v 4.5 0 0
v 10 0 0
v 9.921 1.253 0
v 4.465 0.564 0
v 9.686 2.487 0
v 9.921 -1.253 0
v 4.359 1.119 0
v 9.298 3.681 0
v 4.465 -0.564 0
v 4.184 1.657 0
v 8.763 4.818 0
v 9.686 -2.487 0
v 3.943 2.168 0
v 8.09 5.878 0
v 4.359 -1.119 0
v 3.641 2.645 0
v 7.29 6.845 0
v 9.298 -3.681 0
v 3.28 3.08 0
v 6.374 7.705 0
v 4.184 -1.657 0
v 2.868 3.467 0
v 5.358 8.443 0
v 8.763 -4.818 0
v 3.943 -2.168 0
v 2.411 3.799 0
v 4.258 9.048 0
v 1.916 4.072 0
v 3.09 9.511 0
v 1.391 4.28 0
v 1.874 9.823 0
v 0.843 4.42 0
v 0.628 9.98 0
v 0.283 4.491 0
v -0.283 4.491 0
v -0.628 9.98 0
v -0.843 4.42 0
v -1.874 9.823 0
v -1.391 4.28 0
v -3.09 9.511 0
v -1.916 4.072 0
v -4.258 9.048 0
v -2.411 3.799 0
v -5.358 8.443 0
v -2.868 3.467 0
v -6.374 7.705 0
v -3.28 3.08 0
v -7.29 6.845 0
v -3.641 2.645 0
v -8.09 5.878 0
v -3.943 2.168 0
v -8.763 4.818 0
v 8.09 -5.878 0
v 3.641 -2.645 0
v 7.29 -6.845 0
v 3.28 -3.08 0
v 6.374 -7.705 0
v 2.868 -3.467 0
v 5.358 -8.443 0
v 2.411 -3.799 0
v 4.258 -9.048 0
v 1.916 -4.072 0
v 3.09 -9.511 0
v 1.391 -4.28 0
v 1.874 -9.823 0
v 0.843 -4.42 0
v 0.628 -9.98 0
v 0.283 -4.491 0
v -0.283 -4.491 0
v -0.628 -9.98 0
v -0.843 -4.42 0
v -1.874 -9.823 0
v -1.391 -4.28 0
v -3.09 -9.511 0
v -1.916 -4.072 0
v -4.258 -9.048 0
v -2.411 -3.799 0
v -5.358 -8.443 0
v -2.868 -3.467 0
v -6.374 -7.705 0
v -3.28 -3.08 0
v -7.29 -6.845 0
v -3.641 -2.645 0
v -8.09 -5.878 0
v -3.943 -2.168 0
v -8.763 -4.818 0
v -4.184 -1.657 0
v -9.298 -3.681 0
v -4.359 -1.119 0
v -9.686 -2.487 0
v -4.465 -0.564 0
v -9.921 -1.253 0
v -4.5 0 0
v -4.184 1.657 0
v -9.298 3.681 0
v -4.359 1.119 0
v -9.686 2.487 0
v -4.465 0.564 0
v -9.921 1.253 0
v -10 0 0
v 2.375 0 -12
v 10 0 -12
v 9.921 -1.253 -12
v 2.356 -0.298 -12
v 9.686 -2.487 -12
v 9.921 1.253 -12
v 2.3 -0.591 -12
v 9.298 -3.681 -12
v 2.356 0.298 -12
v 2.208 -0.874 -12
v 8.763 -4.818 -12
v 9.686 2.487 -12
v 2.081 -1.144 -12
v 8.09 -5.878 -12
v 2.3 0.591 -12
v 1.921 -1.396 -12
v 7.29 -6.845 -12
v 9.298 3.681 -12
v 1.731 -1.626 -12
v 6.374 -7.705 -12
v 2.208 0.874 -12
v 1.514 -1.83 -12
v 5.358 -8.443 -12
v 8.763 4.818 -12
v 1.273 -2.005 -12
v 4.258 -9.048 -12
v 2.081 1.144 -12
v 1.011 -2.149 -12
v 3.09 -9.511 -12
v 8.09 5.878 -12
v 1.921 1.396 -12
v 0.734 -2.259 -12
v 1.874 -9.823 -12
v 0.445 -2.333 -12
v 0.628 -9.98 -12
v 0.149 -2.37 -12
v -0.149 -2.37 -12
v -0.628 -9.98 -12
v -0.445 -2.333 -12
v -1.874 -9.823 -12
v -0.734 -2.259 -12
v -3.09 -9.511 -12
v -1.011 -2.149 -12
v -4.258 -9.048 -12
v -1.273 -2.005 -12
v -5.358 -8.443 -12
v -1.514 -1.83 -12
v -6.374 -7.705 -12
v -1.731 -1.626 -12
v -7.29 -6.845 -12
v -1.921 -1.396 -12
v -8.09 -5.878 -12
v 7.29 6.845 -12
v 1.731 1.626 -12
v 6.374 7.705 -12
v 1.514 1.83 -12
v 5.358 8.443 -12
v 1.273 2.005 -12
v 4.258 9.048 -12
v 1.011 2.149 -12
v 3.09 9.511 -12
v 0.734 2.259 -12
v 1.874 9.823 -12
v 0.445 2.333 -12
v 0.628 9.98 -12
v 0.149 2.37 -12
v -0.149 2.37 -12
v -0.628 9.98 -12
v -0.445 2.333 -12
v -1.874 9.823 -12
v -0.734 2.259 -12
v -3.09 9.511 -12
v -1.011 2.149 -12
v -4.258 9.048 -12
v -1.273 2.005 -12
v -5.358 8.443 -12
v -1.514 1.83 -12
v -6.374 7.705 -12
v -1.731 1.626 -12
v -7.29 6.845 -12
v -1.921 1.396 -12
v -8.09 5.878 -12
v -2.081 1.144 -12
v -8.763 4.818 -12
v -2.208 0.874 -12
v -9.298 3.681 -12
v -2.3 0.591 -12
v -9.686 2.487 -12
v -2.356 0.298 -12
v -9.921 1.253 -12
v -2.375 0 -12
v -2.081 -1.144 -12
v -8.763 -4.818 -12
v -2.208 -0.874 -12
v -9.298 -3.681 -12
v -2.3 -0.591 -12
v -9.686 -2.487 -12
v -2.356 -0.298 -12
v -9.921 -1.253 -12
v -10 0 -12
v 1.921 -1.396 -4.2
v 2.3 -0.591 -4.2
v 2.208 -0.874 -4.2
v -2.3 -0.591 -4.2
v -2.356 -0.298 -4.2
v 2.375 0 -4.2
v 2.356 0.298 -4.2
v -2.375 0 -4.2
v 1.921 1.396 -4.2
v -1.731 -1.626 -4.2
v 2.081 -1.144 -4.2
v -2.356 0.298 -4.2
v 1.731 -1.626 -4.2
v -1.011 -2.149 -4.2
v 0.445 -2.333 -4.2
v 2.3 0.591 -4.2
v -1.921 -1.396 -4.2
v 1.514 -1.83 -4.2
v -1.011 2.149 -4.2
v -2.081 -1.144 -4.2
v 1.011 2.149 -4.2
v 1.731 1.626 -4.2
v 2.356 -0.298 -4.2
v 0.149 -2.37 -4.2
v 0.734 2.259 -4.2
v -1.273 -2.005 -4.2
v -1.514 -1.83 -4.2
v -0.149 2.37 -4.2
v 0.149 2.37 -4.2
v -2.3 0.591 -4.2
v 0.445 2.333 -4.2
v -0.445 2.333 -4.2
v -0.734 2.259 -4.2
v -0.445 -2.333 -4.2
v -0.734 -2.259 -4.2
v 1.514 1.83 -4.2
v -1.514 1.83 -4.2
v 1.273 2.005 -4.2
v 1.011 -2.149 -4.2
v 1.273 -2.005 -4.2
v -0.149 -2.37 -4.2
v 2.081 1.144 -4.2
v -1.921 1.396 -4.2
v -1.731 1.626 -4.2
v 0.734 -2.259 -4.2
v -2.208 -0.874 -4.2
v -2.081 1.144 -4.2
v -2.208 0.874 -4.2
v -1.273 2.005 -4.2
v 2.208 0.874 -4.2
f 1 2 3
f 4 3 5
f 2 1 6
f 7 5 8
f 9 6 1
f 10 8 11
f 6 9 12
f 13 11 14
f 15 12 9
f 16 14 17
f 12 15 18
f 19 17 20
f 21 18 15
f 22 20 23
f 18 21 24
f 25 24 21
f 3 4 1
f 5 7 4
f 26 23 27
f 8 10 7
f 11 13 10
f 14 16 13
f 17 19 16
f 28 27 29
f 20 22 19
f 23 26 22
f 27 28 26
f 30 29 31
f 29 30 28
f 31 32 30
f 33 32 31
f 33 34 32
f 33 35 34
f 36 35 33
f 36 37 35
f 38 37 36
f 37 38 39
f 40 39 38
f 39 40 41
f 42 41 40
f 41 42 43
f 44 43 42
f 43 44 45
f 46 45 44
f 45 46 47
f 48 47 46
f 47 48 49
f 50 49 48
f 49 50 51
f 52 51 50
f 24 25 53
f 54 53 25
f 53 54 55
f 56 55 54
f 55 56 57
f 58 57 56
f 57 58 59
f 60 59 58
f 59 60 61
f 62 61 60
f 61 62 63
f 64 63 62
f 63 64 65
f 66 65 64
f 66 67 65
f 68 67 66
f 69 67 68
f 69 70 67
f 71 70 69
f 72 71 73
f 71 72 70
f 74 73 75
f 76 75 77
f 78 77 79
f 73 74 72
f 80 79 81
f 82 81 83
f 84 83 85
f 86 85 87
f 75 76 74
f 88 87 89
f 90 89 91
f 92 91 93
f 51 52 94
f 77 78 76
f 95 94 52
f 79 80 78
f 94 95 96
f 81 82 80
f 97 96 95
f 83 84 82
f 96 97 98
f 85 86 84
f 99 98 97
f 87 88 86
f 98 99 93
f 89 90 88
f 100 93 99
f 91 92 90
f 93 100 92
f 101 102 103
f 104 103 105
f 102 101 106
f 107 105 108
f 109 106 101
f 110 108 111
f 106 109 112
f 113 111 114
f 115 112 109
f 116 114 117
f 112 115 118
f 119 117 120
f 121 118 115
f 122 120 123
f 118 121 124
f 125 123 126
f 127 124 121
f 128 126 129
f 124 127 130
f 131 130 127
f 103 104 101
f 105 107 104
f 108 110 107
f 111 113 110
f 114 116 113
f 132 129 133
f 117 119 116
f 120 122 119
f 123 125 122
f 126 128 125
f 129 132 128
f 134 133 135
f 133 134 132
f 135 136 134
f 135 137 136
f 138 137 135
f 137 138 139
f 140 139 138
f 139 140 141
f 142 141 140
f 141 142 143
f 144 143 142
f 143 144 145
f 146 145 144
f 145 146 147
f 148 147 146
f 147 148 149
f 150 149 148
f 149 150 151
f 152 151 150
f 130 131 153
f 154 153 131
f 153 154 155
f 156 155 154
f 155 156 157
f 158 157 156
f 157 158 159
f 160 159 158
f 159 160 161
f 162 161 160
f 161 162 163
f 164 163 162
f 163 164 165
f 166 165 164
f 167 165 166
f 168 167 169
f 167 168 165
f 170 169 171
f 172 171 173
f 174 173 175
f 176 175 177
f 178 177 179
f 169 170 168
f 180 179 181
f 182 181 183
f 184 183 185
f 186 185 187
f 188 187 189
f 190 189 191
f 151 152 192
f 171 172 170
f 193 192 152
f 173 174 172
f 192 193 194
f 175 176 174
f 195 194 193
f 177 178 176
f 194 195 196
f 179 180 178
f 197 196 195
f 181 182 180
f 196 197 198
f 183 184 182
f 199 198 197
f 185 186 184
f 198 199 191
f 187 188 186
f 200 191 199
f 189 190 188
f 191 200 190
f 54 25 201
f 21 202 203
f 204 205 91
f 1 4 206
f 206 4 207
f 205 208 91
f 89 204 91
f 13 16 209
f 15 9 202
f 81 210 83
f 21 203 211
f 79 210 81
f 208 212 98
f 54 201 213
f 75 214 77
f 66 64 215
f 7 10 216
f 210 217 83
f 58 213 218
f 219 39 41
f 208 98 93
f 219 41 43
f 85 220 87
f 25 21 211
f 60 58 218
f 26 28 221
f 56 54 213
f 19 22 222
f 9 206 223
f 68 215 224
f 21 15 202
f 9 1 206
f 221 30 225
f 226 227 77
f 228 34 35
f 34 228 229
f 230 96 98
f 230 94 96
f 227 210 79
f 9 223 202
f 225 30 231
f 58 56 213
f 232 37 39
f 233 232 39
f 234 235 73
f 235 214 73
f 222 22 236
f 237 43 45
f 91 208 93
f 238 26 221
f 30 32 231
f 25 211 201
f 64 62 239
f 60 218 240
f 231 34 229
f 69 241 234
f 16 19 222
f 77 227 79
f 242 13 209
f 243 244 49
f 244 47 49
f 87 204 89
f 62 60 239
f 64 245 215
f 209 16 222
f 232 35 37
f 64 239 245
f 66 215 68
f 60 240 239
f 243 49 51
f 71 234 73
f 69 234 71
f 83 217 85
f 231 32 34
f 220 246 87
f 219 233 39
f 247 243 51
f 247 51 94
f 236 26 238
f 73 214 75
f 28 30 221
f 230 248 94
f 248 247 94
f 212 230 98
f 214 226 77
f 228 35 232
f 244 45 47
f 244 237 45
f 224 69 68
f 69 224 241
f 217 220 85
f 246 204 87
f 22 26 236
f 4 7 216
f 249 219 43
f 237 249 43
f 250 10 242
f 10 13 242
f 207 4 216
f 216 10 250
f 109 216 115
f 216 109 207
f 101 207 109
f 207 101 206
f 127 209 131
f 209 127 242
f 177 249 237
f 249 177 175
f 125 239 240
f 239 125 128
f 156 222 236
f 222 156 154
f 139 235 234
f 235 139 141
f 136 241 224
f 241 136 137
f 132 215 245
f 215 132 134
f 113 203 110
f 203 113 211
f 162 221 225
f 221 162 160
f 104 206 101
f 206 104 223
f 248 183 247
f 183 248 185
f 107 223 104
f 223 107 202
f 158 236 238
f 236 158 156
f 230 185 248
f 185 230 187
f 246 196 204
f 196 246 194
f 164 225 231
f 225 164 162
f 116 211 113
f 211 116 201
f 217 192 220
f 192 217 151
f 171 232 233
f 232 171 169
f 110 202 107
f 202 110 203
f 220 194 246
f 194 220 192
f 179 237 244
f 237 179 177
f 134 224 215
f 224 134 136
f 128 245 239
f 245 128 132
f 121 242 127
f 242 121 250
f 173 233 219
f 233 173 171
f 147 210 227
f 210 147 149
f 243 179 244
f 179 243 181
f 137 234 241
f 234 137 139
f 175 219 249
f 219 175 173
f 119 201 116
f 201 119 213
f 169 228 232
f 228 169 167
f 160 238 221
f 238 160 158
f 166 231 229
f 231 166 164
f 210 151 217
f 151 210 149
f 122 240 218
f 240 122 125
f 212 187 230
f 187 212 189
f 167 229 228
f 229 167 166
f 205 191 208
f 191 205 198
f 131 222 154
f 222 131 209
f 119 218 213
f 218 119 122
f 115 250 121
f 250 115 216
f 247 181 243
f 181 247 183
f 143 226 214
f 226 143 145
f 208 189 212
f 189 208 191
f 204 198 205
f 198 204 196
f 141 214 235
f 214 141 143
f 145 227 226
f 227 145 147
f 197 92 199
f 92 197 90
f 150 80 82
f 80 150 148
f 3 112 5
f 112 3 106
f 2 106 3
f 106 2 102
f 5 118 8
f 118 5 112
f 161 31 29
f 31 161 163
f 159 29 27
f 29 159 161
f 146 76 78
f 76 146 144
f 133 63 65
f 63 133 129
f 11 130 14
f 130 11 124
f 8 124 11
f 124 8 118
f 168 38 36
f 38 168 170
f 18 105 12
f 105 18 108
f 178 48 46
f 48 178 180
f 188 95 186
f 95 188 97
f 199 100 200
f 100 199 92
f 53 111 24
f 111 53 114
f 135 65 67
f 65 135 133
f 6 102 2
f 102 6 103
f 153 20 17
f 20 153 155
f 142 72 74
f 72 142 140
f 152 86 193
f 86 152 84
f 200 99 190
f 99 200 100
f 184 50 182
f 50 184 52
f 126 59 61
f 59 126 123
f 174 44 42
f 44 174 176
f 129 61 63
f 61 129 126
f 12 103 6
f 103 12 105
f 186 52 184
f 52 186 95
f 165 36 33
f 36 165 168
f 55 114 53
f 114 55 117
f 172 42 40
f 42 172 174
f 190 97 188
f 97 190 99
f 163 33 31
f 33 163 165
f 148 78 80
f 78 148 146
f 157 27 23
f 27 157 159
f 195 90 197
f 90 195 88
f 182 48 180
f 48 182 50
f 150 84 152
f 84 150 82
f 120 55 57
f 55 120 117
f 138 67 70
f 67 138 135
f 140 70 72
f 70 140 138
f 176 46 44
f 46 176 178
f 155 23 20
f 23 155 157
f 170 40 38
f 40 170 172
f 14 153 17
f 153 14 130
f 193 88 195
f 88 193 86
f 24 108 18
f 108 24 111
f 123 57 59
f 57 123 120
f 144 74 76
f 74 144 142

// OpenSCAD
$fn = 50;


difference() {
	union() {
		translate(v = [0, 0, -12.0000000000]) {
			cylinder(h = 12, r = 10.0000000000);
		}
		cylinder(h = 0, r = 13.0000000000);
	}
	union() {
		translate(v = [0, 0, 0]) {
			rotate(a = [0, 0, 0]) {
				difference() {
					union() {
						#translate(v = [0, 0, -12.0000000000]) {
							cylinder(h = 12, r = 2.2500000000);
						}
						#translate(v = [0, 0, -4.2000000000]) {
							cylinder(h = 4.2000000000, r1 = 2.3750000000, r2 = 4.5000000000);
						}
						#translate(v = [0, 0, -12.0000000000]) {
							cylinder(h = 12, r = 2.3750000000);
						}
						#translate(v = [0, 0, -12.0000000000]) {
							cylinder(h = 12, r = 2.2500000000);
						}
					}
					union();
				}
			}
		}
	}
}
